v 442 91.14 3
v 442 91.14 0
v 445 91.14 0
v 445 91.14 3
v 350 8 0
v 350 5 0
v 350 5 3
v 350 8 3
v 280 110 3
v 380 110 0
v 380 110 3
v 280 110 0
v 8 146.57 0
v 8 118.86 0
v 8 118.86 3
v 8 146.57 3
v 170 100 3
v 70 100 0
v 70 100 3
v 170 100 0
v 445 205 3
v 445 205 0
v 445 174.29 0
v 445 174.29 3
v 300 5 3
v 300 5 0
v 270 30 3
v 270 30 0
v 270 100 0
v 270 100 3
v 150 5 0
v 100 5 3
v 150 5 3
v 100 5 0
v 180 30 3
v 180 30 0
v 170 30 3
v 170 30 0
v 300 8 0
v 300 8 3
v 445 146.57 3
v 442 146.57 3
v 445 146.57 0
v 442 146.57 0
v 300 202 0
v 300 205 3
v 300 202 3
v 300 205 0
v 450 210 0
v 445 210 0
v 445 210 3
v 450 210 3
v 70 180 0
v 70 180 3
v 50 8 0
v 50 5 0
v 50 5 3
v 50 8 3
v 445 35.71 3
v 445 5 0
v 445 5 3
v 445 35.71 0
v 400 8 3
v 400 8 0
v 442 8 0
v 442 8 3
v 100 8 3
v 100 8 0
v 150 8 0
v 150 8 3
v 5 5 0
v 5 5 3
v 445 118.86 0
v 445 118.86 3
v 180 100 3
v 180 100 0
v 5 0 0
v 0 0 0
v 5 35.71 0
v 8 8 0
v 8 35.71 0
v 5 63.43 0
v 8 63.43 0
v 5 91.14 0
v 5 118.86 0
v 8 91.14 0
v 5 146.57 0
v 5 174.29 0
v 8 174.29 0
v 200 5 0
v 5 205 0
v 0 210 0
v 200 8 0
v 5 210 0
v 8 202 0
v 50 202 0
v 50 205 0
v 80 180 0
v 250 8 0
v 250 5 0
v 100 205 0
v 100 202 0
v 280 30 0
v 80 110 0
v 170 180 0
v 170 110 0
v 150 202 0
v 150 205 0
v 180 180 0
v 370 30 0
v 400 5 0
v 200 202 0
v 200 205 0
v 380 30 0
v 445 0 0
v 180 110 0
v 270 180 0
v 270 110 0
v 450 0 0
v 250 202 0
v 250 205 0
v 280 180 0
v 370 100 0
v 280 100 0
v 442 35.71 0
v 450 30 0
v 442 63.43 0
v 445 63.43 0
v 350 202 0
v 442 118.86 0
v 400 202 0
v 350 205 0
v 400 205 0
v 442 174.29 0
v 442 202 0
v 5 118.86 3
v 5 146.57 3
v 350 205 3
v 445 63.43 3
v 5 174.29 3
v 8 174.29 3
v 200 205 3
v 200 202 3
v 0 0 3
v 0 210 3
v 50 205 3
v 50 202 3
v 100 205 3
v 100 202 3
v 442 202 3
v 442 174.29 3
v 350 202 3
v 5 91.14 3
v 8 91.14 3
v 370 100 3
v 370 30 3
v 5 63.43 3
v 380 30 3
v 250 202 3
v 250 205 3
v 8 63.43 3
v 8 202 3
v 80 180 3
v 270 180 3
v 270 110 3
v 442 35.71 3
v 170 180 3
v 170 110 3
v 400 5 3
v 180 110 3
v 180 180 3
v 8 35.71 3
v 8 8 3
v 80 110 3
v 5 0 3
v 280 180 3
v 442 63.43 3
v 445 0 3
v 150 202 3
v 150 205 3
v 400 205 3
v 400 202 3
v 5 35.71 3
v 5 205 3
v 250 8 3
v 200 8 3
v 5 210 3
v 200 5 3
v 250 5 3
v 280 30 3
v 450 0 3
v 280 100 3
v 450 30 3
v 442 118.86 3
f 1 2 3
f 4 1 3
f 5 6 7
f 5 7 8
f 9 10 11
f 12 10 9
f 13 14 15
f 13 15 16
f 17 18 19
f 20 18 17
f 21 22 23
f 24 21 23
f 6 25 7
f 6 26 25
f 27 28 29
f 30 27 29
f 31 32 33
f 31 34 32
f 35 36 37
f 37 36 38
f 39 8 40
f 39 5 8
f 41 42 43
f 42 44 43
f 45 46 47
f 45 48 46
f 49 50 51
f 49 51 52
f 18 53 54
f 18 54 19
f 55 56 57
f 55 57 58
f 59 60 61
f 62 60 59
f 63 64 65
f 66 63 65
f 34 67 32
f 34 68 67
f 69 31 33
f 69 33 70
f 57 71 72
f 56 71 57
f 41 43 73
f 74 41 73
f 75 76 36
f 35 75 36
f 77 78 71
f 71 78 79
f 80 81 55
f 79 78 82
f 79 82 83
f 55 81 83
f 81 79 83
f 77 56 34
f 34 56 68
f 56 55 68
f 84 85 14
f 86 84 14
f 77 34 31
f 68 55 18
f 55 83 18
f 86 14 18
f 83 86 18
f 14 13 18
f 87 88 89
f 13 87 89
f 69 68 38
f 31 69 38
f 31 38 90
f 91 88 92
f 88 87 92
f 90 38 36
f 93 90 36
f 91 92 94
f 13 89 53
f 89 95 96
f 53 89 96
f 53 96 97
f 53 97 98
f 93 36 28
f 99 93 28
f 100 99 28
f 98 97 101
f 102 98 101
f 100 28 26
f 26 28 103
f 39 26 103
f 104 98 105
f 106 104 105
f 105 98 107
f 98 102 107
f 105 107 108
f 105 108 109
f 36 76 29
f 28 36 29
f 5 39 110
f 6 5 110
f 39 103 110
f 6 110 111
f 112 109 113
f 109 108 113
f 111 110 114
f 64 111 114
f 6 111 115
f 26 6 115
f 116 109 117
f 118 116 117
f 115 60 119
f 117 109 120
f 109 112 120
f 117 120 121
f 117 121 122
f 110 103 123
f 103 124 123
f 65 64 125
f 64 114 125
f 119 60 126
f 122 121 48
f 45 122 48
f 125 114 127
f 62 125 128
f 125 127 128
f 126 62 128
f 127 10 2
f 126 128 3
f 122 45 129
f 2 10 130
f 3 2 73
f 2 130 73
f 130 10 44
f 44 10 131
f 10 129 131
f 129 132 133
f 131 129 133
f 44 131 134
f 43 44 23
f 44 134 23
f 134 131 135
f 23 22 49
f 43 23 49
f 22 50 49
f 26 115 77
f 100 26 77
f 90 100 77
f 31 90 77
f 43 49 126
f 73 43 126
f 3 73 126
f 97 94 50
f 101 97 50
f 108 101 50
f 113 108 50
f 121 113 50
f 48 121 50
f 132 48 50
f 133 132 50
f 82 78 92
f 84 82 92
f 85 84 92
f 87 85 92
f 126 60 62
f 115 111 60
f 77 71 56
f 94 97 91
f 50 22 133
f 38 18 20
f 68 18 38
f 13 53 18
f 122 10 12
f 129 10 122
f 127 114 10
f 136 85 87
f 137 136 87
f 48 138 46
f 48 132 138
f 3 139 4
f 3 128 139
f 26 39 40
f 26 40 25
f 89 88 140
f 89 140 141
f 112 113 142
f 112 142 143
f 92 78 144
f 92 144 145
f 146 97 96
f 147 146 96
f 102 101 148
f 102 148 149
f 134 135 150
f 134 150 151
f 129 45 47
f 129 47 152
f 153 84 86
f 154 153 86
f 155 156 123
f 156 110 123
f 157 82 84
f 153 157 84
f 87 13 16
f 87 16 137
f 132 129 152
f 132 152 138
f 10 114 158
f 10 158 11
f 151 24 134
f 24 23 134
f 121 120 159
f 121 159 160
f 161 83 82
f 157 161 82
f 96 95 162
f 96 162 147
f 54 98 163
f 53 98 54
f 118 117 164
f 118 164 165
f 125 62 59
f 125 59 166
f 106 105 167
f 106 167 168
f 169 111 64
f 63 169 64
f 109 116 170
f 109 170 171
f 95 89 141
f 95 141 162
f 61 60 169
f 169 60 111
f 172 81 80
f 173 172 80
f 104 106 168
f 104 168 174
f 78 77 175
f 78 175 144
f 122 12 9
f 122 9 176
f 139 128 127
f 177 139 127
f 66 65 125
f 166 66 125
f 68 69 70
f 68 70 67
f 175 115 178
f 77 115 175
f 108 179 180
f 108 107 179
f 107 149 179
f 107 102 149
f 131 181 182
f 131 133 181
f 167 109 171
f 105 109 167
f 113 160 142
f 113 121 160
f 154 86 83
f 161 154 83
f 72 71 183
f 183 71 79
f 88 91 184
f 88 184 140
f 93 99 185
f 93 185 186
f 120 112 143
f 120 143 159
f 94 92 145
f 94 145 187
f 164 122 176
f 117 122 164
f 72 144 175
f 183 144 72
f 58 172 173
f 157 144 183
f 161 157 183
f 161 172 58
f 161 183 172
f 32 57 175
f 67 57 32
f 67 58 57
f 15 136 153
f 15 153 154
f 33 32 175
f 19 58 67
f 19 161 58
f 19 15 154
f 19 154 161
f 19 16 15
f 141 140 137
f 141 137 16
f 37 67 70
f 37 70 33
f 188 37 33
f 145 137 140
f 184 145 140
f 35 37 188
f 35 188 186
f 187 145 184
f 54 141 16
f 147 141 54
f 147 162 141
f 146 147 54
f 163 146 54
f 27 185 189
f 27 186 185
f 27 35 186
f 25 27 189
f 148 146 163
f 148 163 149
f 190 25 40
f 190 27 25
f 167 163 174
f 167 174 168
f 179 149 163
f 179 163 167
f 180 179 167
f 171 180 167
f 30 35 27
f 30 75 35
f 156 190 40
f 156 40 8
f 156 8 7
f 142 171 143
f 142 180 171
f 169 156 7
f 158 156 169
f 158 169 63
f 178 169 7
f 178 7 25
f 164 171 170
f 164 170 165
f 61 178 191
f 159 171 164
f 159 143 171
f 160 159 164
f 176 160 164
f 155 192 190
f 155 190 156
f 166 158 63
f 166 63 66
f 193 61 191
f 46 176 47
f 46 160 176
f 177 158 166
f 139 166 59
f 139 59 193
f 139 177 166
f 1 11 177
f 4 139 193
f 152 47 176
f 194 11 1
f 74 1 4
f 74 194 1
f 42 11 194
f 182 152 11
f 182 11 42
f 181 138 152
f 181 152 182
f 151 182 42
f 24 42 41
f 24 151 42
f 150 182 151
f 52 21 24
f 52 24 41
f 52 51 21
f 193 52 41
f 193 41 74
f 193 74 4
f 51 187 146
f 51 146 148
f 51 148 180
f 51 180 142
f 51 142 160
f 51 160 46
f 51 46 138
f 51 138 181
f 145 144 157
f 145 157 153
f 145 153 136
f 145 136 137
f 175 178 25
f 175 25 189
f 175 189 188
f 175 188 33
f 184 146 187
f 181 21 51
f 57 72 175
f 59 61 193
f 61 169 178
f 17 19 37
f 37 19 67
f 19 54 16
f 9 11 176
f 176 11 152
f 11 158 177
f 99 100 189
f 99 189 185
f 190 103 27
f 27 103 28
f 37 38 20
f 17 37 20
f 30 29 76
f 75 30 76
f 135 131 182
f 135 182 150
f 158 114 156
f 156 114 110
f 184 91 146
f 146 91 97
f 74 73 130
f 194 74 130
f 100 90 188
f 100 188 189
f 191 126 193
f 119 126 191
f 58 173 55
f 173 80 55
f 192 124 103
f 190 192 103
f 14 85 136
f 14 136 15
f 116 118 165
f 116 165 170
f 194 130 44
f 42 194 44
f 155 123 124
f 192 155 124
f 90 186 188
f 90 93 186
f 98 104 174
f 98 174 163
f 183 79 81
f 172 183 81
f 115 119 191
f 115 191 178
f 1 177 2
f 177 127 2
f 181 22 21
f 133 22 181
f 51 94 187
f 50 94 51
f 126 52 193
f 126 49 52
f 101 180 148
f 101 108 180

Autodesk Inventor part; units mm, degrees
ref_plane "YZ Plane" through (0, 0, 0) normal (1, 0, 0) x (0, 1, 0)
ref_plane "XZ Plane" through (0, 0, 0) normal (0, 1, 0) x (-1, 0, 0)
ref_plane "XY Plane" through (0, 0, 0) normal (0, 0, 1) x (1, 0, 0)
sketch "Boceto1" plane through (0, 0, 0) normal (0, 0, 1) x (1, 0, 0)
  line L0 (0, 0) -> (0, 210)
  line L1 (0, 210) -> (450, 210)
  line L2 (450, 210) -> (450, 0)
  line L3 (450, 0) -> (0, 0)
  line L4 (0, 210) -> (5, 210)
  line L5 (5, 205) -> (50, 205)
  line L6 (50, 205) -> (50, 202)
  line L7 (5, 205) -> (5, 174.29)
  line L8 (5, 174.29) -> (8, 174.29)
  line L9 (8, 174.29) -> (8, 202)
  line L10 (8, 202) -> (50, 202)
  line L11 (0, 0) -> (5, 0)
  line L12 (0, 0) -> (5, 0)
  line L13 (5, 5) -> (50, 5)
  line L14 (5, 5) -> (5, 35.71)
  line L15 (5, 35.71) -> (8, 35.71)
  line L16 (50, 5) -> (50, 8)
  line L17 (8, 35.71) -> (8, 8)
  line L18 (8, 8) -> (50, 8)
  line L19 (450, 0) -> (445, 0)
  line L20 (445, 5) -> (445, 35.71)
  line L21 (445, 35.71) -> (442, 35.71)
  line L22 (445, 5) -> (400, 5)
  line L23 (400, 5) -> (400, 8)
  line L24 (400, 8) -> (442, 8)
  line L25 (442, 8) -> (442, 35.71)
  line L26 (450, 210) -> (445, 210)
  line L27 (445, 205) -> (400, 205)
  line L28 (445, 205) -> (445, 174.29)
  line L29 (445, 174.29) -> (442, 174.29)
  line L30 (400, 205) -> (400, 202)
  line L31 (400, 202) -> (442, 202)
  line L32 (442, 202) -> (442, 174.29)
  line L33 (5, 63.43) -> (5, 91.14)
  line L34 (5, 91.14) -> (8, 91.14)
  line L35 (8, 91.14) -> (8, 63.43)
  line L36 (8, 63.43) -> (5, 63.43)
  line L37 (5, 118.86) -> (5, 146.57)
  line L38 (5, 118.86) -> (8, 118.86)
  line L39 (8, 118.86) -> (8, 146.57)
  line L40 (8, 146.57) -> (5, 146.57)
  line L41 (445, 63.43) -> (445, 91.14)
  line L42 (445, 63.43) -> (442, 63.43)
  line L43 (442, 63.43) -> (442, 91.14)
  line L44 (442, 91.14) -> (445, 91.14)
  line L45 (445, 118.86) -> (442, 118.86)
  line L46 (442, 118.86) -> (442, 146.57)
  line L47 (442, 146.57) -> (445, 146.57)
  line L48 (445, 146.57) -> (445, 118.86)
  line L49 (350, 205) -> (300, 205)
  line L50 (300, 205) -> (300, 202)
  line L51 (300, 202) -> (350, 202)
  line L52 (350, 202) -> (350, 205)
  line L53 (250, 205) -> (200, 205)
  line L54 (200, 205) -> (200, 202)
  line L55 (200, 202) -> (250, 202)
  line L56 (250, 202) -> (250, 205)
  line L57 (150, 205) -> (100, 205)
  line L58 (100, 205) -> (100, 202)
  line L59 (100, 202) -> (150, 202)
  line L60 (150, 202) -> (150, 205)
  line L61 (350, 8) -> (300, 8)
  line L62 (300, 8) -> (300, 5)
  line L63 (300, 5) -> (350, 5)
  line L64 (350, 5) -> (350, 8)
  line L65 (250, 8) -> (200, 8)
  line L66 (200, 8) -> (200, 5)
  line L67 (200, 5) -> (250, 5)
  line L68 (250, 5) -> (250, 8)
  line L69 (150, 8) -> (100, 8)
  line L70 (100, 8) -> (100, 5)
  line L71 (100, 5) -> (150, 5)
  line L72 (150, 5) -> (150, 8)
  line L73 (450, 0) -> (450, 30)
  line L74 (380, 30) -> (380, 110)
  line L75 (380, 30) -> (370, 30)
  line L76 (370, 30) -> (370, 100)
  line L77 (380, 110) -> (280, 110)
  line L78 (370, 100) -> (280, 100)
  line L79 (280, 110) -> (280, 180)
  line L80 (280, 100) -> (280, 30)
  line L81 (280, 30) -> (270, 30)
  line L82 (270, 30) -> (270, 100)
  line L83 (280, 180) -> (270, 180)
  line L84 (270, 180) -> (270, 110)
  line L85 (270, 100) -> (180, 100)
  line L86 (270, 110) -> (180, 110)
  line L87 (180, 110) -> (180, 180)
  line L88 (180, 180) -> (170, 180)
  line L89 (170, 180) -> (170, 110)
  line L90 (180, 100) -> (180, 30)
  line L91 (180, 30) -> (170, 30)
  line L92 (170, 30) -> (170, 100)
  line L93 (170, 110) -> (80, 110)
  line L94 (80, 110) -> (80, 180)
  line L95 (80, 180) -> (70, 180)
  line L96 (70, 180) -> (70, 100)
  line L97 (70, 100) -> (170, 100)
  dimension "d93" = 450
  dimension "d94" = 210
  dimension "d95" = 210
  dimension "d96" = 450
  dimension "d97" = 5
  dimension "d98" = 30.71
  dimension "d99" = 45
  dimension "d100" = 5
  dimension "d101" = 3
  dimension "d102" = 3
  dimension "d103" = 5
  dimension "d104" = 5
  dimension "d105" = 3
  dimension "d106" = 30.71
  dimension "d107" = 45
  dimension "d108" = 3
  dimension "d109" = 5
  dimension "d110" = 30.71
  dimension "d111" = 45
  dimension "d112" = 5
  dimension "d113" = 3
  dimension "d114" = 3
  dimension "d115" = 30.71
  dimension "d116" = 5
  dimension "d117" = 45
  dimension "d118" = 5
  dimension "d119" = 3
  dimension "d120" = 3
  dimension "d121" = 3
  dimension "d122" = 3
  dimension "d123" = 3
  dimension "d124" = 5
  dimension "d125" = 5
  dimension "d126" = 5
  dimension "d127" = 5
  dimension "d128" = 5
  dimension "d129" = 5
  dimension "d130" = 27.72
  dimension "d131" = 27.71
  dimension "d132" = 27.71
  dimension "d133" = 27.72
  dimension "d134" = 27.72
  dimension "d135" = 50
  dimension "d136" = 50
  dimension "d137" = 50
  dimension "d138" = 50
  dimension "d139" = 50
  dimension "d140" = 50
  dimension "d141" = 50
extrude "Extrusión1" add sketch "Boceto1" along normal blind 3
properties part number "Frontal" material "Madera (nogal)"
